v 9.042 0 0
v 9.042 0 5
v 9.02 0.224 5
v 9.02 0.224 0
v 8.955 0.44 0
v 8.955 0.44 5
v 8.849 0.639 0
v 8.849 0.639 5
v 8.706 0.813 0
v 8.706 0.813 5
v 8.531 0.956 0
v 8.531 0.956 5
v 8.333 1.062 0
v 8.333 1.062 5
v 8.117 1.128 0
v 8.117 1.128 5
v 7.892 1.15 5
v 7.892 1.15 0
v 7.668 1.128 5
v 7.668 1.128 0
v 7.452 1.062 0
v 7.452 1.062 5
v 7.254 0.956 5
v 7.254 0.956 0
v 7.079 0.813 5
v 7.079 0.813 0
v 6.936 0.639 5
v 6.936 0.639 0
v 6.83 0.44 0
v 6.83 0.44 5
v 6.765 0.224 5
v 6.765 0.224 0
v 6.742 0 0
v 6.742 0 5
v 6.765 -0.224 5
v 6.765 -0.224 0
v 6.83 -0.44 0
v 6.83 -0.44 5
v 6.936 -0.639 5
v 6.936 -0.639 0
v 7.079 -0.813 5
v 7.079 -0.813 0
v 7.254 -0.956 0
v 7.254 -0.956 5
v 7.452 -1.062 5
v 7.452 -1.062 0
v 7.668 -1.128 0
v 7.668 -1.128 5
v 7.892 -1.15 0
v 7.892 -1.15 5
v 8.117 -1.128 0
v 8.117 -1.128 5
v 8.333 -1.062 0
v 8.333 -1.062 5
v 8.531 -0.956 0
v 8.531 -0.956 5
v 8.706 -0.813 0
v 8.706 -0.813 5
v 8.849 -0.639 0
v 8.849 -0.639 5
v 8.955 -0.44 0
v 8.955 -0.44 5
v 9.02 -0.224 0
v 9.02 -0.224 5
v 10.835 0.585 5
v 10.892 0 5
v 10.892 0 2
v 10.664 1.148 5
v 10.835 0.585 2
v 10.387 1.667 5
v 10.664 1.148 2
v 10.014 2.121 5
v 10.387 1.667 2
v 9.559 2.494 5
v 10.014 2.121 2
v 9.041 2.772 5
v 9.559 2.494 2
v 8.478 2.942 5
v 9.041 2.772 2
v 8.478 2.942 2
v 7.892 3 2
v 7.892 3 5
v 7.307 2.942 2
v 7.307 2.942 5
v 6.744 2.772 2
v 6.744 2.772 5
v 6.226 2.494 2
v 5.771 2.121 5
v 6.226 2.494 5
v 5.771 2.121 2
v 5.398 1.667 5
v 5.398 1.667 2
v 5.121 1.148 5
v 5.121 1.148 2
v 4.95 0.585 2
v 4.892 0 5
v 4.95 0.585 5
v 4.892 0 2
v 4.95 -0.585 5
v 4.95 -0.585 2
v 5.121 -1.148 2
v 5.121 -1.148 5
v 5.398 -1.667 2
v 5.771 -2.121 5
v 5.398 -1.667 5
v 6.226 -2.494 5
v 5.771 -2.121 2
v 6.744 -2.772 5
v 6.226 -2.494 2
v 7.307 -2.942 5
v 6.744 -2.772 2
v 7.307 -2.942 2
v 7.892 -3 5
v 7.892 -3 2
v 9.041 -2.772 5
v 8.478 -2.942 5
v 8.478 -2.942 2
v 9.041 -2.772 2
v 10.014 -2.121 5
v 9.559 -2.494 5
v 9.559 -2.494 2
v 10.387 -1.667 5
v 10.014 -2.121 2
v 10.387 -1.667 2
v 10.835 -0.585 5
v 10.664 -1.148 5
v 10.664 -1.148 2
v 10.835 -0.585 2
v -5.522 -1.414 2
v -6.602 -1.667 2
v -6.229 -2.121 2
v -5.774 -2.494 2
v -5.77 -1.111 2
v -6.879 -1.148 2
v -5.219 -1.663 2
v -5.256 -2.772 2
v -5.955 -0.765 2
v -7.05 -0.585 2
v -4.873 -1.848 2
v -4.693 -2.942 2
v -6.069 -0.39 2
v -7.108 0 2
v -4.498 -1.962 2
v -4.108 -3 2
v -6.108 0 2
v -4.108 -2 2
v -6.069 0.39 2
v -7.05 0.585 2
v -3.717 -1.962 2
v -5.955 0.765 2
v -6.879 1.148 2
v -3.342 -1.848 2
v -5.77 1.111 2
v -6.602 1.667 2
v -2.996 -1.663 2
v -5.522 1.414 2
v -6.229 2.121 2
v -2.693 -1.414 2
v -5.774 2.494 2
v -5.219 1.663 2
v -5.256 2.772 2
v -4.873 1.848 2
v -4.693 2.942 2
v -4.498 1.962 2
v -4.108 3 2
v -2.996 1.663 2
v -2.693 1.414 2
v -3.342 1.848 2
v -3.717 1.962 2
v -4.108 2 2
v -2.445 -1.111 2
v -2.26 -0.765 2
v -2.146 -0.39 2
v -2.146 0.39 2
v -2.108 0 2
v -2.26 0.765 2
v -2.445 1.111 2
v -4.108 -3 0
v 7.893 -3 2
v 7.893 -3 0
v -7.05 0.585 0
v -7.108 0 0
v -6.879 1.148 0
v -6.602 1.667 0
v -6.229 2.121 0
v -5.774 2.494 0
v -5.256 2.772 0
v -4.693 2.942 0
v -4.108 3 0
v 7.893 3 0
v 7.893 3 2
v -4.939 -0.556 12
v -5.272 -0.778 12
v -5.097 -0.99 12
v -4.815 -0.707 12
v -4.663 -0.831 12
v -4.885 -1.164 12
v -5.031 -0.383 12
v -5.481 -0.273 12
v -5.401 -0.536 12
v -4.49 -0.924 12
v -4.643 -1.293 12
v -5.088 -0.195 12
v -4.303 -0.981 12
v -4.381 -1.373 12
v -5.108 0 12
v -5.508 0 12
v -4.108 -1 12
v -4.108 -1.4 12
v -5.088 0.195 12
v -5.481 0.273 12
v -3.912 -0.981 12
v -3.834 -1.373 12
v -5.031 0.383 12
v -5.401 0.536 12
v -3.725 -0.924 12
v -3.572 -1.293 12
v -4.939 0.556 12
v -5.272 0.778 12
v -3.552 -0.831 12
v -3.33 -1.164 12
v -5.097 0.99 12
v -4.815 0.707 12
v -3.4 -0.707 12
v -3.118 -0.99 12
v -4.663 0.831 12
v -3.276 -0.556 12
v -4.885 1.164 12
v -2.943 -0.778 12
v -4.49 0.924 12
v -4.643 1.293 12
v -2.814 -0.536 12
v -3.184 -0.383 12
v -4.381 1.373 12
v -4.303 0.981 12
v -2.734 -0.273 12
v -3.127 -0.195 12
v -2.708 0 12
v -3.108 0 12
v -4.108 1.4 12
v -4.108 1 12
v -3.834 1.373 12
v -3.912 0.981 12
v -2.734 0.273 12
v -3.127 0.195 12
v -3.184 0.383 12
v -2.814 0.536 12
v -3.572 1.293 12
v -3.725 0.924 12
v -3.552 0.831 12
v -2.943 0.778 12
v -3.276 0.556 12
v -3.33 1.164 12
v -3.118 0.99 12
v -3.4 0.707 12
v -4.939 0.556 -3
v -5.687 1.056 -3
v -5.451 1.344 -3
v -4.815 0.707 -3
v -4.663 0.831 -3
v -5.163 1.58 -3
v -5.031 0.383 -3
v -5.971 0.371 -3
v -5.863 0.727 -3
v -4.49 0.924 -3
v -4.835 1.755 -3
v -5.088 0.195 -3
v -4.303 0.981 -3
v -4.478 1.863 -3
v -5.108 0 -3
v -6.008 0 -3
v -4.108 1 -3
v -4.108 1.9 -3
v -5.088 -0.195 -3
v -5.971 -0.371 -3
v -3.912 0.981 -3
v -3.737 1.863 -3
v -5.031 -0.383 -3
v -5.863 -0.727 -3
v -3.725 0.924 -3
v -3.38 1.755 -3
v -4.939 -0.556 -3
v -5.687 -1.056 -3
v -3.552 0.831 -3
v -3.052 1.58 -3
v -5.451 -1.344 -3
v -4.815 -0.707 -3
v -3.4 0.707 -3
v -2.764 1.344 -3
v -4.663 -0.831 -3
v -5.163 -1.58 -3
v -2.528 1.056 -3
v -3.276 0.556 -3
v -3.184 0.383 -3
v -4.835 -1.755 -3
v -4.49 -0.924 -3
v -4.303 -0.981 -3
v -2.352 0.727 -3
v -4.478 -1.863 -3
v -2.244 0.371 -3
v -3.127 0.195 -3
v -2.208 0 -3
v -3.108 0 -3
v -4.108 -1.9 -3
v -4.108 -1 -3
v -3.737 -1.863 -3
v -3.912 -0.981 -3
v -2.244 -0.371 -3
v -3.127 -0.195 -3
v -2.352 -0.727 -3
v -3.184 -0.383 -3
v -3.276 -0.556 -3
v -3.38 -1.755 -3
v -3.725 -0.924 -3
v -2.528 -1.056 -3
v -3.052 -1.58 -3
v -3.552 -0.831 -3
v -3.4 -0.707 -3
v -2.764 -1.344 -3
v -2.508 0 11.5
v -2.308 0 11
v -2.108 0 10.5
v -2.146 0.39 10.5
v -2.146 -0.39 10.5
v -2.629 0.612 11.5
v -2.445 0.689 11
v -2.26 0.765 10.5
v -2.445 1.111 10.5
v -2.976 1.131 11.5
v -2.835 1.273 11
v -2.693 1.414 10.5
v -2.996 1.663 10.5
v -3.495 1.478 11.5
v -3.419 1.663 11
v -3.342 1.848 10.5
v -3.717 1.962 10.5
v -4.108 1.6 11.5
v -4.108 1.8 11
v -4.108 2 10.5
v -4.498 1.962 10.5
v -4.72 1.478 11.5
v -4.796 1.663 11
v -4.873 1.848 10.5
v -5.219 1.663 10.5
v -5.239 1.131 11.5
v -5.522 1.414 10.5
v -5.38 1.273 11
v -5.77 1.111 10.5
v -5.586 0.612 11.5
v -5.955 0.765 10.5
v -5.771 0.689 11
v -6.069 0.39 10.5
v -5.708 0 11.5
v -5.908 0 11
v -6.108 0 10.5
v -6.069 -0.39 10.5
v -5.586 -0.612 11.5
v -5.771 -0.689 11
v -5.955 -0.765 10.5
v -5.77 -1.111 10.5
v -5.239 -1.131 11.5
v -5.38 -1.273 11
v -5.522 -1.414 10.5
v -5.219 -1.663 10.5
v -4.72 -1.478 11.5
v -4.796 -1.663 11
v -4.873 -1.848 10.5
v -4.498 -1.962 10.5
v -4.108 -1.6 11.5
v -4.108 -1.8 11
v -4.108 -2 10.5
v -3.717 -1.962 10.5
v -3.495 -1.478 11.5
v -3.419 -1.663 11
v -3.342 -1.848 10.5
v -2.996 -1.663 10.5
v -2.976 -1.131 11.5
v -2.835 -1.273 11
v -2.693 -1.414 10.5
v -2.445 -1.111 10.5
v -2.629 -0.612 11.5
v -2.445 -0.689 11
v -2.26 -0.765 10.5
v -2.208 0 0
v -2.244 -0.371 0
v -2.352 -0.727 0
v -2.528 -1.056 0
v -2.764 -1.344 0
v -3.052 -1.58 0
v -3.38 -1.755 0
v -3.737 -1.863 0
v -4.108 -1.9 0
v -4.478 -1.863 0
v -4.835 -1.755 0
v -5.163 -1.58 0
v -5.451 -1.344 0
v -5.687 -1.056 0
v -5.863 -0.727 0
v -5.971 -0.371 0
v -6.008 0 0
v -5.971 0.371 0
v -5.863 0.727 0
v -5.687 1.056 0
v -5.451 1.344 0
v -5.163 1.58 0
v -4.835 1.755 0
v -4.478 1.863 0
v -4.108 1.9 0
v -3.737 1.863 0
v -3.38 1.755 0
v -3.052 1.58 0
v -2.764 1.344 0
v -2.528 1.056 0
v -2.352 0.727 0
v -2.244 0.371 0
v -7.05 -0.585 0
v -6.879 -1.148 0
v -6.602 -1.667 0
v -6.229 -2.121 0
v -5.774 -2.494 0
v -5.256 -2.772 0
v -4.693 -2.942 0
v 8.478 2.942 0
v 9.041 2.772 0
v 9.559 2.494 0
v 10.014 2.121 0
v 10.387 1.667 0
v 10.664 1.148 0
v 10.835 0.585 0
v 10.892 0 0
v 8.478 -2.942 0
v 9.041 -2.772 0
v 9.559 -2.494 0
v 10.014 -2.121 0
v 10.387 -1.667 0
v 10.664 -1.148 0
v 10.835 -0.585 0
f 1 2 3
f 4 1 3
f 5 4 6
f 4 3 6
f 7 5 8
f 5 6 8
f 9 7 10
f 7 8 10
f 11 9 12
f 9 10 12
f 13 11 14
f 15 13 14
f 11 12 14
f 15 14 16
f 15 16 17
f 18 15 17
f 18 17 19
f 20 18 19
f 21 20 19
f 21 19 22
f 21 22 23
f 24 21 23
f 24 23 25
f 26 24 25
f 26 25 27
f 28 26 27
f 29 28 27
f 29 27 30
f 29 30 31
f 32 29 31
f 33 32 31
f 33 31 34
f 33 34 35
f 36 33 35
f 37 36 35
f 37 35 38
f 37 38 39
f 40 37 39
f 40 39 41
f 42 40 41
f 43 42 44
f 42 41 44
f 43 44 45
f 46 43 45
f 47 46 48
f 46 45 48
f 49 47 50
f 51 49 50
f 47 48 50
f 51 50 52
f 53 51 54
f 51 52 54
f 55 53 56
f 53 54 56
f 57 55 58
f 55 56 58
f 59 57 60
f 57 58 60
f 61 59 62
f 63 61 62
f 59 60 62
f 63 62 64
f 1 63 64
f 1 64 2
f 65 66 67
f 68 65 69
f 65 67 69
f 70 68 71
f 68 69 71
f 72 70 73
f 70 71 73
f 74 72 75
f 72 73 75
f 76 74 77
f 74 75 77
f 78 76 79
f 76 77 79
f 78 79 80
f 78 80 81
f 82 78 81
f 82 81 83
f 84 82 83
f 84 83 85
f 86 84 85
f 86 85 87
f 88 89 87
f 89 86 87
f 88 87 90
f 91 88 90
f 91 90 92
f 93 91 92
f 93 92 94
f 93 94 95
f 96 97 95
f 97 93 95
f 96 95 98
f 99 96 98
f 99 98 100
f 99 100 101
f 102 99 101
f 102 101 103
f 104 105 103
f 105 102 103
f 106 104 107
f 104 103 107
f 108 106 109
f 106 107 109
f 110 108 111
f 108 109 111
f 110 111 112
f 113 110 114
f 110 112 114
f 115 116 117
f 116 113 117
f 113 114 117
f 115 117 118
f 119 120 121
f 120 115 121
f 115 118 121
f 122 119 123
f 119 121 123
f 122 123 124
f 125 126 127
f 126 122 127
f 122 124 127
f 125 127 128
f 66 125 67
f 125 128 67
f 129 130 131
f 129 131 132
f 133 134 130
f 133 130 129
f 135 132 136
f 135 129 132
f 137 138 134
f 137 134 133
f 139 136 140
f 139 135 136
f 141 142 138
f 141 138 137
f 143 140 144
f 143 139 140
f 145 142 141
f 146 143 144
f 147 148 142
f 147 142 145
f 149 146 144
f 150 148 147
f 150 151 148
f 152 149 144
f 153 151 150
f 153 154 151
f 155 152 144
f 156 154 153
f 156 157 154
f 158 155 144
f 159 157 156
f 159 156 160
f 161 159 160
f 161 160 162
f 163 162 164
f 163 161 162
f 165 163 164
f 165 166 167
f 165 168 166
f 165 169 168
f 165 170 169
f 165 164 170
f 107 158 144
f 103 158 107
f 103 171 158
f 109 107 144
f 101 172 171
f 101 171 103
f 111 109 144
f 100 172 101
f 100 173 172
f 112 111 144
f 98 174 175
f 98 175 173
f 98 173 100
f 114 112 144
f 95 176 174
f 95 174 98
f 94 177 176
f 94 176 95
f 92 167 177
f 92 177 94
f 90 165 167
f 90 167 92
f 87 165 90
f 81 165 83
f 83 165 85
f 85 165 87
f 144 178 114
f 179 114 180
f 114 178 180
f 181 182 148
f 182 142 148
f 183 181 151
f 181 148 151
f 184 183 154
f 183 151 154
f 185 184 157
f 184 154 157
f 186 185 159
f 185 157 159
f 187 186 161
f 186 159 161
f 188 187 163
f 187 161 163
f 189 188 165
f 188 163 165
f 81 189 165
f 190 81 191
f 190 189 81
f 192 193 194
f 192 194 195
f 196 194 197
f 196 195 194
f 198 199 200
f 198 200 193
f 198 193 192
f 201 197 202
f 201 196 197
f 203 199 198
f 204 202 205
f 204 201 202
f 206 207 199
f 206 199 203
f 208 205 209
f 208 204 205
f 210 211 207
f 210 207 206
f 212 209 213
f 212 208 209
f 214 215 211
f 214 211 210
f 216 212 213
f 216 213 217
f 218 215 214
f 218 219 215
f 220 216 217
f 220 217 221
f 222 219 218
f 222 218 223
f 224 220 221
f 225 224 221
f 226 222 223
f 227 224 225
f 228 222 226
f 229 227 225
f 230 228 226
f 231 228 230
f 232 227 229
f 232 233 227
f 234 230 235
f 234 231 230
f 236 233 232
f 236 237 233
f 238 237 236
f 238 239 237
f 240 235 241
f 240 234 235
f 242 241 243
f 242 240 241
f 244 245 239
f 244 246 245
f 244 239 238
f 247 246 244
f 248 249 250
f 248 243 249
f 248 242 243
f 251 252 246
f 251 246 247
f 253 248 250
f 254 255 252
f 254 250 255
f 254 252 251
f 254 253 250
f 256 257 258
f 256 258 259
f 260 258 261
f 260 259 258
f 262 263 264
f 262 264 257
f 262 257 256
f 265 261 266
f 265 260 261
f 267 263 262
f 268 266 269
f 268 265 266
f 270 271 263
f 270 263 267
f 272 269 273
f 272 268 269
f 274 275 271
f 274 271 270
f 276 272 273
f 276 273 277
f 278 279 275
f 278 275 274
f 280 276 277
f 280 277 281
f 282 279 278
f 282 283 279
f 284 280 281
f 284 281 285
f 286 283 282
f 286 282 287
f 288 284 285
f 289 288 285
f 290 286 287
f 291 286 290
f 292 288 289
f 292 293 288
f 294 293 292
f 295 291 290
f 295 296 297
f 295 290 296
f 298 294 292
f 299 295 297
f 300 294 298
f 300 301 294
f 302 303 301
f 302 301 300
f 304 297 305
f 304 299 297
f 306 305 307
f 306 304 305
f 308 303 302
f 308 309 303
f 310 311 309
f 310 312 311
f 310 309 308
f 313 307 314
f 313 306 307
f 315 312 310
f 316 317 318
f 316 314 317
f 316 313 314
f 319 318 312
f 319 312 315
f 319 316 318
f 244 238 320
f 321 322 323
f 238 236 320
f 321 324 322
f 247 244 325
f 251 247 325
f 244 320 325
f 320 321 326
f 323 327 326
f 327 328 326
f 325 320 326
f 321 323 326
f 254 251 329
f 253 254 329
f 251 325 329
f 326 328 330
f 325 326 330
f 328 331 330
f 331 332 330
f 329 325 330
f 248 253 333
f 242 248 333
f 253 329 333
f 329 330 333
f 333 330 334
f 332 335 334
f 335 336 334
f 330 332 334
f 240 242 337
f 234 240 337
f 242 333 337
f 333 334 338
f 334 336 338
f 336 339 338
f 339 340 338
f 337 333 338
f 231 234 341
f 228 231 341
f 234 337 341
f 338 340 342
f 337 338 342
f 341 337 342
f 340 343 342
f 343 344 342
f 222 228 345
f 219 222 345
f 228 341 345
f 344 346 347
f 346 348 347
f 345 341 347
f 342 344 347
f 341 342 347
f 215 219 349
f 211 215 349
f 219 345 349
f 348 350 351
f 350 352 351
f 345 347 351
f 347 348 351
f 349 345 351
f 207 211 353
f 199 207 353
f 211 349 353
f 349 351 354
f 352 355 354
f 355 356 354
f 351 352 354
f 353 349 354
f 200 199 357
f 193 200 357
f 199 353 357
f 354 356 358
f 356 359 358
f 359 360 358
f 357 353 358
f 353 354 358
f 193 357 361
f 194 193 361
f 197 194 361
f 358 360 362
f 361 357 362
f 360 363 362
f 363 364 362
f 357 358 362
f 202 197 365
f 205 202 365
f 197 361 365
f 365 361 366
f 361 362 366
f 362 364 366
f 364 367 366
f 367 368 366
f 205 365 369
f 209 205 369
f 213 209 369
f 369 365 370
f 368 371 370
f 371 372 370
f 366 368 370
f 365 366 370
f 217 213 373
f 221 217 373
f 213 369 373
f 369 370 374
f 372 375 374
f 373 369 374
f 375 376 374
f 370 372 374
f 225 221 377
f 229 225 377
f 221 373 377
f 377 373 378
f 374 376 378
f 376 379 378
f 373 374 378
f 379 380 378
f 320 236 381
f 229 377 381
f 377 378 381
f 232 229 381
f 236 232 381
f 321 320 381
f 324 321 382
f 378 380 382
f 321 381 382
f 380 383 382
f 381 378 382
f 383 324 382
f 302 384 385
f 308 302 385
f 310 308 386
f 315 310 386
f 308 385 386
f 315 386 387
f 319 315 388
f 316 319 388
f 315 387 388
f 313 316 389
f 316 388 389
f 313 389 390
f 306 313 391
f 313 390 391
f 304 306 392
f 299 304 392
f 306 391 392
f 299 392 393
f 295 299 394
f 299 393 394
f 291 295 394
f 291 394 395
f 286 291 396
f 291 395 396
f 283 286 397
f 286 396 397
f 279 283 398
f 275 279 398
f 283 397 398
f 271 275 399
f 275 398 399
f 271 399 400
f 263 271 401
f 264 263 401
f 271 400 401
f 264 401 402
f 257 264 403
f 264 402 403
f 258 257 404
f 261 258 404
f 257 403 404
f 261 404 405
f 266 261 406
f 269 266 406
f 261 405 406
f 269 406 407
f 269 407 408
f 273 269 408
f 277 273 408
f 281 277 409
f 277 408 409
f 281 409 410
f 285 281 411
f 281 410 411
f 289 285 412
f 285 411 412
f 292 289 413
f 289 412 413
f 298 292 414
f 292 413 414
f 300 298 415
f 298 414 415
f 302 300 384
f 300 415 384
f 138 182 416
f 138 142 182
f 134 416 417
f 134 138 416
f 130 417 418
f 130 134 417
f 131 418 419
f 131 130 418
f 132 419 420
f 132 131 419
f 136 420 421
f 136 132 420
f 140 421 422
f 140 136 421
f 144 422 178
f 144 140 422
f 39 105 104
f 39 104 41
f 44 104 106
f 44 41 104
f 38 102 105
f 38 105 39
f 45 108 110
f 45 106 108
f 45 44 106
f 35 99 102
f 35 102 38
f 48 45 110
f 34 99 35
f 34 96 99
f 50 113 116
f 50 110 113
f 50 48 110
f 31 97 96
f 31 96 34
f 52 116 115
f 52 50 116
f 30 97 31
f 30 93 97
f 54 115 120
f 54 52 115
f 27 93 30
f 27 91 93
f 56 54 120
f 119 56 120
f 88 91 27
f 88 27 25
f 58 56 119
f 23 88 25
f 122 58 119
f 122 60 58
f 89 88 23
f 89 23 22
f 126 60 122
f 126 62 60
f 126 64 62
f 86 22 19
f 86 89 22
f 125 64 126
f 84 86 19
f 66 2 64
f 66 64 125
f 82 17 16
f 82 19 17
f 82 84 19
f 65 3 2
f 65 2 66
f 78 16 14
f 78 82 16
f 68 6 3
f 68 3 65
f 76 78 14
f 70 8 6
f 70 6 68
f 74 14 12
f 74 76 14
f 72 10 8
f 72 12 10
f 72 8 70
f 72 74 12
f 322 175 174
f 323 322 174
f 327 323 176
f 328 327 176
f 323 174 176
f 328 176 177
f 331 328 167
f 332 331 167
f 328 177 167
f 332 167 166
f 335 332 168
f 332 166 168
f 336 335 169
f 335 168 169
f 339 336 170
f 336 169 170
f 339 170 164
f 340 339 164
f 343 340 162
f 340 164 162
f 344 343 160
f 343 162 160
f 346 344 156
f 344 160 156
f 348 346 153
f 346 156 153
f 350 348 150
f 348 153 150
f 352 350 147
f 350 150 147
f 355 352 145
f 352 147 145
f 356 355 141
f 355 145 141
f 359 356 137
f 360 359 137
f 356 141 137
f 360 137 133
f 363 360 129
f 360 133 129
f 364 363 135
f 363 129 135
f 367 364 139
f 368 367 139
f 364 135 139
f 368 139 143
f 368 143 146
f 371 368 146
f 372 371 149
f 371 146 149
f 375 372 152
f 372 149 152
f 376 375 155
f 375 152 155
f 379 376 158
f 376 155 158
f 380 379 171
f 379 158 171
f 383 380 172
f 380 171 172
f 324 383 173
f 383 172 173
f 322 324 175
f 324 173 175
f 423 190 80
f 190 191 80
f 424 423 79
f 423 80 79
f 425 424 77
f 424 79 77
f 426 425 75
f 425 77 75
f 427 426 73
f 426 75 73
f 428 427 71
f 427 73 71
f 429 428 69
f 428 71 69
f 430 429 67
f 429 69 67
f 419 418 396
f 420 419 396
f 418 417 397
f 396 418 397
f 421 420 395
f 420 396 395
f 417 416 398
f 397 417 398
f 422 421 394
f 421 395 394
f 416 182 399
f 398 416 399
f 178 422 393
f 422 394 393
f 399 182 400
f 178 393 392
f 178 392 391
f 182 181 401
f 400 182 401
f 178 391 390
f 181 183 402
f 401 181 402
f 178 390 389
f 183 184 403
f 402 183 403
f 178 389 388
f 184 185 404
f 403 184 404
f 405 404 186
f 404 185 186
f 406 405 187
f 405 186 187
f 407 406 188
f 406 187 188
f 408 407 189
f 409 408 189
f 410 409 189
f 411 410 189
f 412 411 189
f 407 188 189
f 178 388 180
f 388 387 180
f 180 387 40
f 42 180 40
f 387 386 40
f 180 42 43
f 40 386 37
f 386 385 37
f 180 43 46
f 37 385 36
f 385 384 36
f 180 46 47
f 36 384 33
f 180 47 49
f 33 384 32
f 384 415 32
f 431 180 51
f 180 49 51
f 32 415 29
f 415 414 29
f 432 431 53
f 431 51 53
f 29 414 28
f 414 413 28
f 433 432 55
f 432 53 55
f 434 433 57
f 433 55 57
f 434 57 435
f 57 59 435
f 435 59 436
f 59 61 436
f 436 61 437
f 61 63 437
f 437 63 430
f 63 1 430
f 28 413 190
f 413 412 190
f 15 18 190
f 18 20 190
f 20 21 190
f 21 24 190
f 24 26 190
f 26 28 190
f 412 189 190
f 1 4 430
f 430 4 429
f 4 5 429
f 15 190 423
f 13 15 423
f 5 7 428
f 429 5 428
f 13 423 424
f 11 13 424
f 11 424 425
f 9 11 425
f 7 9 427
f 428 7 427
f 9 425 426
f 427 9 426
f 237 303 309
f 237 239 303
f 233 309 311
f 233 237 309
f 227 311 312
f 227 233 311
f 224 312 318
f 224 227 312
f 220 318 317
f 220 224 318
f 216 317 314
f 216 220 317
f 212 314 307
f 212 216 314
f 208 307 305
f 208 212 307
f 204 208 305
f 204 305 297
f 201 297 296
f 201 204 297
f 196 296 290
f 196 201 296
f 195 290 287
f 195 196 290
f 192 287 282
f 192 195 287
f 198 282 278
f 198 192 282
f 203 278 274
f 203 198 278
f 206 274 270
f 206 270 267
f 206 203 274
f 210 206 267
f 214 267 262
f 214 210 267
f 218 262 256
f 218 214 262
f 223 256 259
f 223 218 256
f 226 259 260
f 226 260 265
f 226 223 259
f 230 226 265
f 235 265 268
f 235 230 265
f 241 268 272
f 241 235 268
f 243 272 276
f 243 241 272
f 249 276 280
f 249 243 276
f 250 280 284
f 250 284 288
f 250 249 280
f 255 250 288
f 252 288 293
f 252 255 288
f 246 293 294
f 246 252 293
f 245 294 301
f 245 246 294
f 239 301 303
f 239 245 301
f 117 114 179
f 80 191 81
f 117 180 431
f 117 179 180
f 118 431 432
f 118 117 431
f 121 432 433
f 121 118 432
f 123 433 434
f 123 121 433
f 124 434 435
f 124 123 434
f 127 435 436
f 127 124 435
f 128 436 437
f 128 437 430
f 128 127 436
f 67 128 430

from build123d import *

# Parameters (mm, degrees)
F0_W      = 18
F0_H      = 6
F1_DEPTH  = 2
F2_R      = 3
F2_R_2    = 2
F3_DEPTH  = 10
F4_R      = 1
F4_R_2    = 1.15
F5_DEPTH  = 20
F6_SIZE2  = 1.5
F6_SIZE   = 0.6
F7_W      = 11.6012076614
F7_H      = 11.8295210414
F8_DEPTH  = 7
F9_R      = 2.9999
F10_R     = 1.9
F10_R_2   = 1
F11_DEPTH = 3


# Not quite as in the source:
# - a fillet or chamfer is up to 0.001 mm smaller than in the source, because OpenCascade refuses the exact size


with BuildPart() as f1:
    # F0 (on Top) → F1 (new body)
    with BuildSketch(Plane.XY):
        with Locations((1.8924829921, 0)):
            Rectangle(F0_W, F0_H)
    extrude(amount=F1_DEPTH)

    # F2 (on face) → F3 (join)
    with BuildSketch(Plane.XY.offset(2)):
        with Locations((7.8924829921, 0)):
            Circle(F2_R)
        with Locations((-4.1075170079, 0)):
            Circle(F2_R_2)
    extrude(amount=F3_DEPTH)

    # F4 (on face) → F5 (cut)
    with BuildSketch(Plane.XY.offset(12)):
        with Locations((-4.1075170079, 0)):
            Circle(F4_R)
        with Locations((7.8924829921, 0)):
            Circle(F4_R_2)
    extrude(amount=-F5_DEPTH, mode=Mode.SUBTRACT)

    # F6
    f6_edges = [f1.edges().sort_by_distance(p)[0] for p in [
        (-6.107517, 0, 12),
    ]]
    f6_side = f1.faces().sort_by_distance((-6.050948, 0, 12))[0]
    chamfer(f6_edges, length=F6_SIZE, length2=F6_SIZE2, reference=f6_side)

    # F7 (on face) → F8 (cut)
    with BuildSketch(Plane.XY.offset(12)):
        with Locations((7.5882198871, -0.5373002496)):
            Rectangle(F7_W, F7_H)
    extrude(amount=-F8_DEPTH, mode=Mode.SUBTRACT)

    # F9 (radius 3 in the source; OpenCascade refuses exactly that, so slightly less here)
    f9_edges = [f1.edges().sort_by_distance(p)[0] for p in [
        (10.892483, -3, 1),
        (10.892483, 3, 1),
        (-7.107517, 3, 1),
        (-7.107517, -3, 1),
    ]]
    fillet(f9_edges, radius=F9_R)

    # F10 (on face) → F11 (join)
    with BuildSketch(Plane(origin=(0, 0, 0), x_dir=(1, 0, 0), z_dir=(0, 0, -1))):
        with Locations((-4.1075170079, 0)):
            Circle(F10_R)
        with Locations((-4.1075170079, 0)):
            Circle(F10_R_2, mode=Mode.SUBTRACT)
    extrude(amount=F11_DEPTH)


solid = f1.part
